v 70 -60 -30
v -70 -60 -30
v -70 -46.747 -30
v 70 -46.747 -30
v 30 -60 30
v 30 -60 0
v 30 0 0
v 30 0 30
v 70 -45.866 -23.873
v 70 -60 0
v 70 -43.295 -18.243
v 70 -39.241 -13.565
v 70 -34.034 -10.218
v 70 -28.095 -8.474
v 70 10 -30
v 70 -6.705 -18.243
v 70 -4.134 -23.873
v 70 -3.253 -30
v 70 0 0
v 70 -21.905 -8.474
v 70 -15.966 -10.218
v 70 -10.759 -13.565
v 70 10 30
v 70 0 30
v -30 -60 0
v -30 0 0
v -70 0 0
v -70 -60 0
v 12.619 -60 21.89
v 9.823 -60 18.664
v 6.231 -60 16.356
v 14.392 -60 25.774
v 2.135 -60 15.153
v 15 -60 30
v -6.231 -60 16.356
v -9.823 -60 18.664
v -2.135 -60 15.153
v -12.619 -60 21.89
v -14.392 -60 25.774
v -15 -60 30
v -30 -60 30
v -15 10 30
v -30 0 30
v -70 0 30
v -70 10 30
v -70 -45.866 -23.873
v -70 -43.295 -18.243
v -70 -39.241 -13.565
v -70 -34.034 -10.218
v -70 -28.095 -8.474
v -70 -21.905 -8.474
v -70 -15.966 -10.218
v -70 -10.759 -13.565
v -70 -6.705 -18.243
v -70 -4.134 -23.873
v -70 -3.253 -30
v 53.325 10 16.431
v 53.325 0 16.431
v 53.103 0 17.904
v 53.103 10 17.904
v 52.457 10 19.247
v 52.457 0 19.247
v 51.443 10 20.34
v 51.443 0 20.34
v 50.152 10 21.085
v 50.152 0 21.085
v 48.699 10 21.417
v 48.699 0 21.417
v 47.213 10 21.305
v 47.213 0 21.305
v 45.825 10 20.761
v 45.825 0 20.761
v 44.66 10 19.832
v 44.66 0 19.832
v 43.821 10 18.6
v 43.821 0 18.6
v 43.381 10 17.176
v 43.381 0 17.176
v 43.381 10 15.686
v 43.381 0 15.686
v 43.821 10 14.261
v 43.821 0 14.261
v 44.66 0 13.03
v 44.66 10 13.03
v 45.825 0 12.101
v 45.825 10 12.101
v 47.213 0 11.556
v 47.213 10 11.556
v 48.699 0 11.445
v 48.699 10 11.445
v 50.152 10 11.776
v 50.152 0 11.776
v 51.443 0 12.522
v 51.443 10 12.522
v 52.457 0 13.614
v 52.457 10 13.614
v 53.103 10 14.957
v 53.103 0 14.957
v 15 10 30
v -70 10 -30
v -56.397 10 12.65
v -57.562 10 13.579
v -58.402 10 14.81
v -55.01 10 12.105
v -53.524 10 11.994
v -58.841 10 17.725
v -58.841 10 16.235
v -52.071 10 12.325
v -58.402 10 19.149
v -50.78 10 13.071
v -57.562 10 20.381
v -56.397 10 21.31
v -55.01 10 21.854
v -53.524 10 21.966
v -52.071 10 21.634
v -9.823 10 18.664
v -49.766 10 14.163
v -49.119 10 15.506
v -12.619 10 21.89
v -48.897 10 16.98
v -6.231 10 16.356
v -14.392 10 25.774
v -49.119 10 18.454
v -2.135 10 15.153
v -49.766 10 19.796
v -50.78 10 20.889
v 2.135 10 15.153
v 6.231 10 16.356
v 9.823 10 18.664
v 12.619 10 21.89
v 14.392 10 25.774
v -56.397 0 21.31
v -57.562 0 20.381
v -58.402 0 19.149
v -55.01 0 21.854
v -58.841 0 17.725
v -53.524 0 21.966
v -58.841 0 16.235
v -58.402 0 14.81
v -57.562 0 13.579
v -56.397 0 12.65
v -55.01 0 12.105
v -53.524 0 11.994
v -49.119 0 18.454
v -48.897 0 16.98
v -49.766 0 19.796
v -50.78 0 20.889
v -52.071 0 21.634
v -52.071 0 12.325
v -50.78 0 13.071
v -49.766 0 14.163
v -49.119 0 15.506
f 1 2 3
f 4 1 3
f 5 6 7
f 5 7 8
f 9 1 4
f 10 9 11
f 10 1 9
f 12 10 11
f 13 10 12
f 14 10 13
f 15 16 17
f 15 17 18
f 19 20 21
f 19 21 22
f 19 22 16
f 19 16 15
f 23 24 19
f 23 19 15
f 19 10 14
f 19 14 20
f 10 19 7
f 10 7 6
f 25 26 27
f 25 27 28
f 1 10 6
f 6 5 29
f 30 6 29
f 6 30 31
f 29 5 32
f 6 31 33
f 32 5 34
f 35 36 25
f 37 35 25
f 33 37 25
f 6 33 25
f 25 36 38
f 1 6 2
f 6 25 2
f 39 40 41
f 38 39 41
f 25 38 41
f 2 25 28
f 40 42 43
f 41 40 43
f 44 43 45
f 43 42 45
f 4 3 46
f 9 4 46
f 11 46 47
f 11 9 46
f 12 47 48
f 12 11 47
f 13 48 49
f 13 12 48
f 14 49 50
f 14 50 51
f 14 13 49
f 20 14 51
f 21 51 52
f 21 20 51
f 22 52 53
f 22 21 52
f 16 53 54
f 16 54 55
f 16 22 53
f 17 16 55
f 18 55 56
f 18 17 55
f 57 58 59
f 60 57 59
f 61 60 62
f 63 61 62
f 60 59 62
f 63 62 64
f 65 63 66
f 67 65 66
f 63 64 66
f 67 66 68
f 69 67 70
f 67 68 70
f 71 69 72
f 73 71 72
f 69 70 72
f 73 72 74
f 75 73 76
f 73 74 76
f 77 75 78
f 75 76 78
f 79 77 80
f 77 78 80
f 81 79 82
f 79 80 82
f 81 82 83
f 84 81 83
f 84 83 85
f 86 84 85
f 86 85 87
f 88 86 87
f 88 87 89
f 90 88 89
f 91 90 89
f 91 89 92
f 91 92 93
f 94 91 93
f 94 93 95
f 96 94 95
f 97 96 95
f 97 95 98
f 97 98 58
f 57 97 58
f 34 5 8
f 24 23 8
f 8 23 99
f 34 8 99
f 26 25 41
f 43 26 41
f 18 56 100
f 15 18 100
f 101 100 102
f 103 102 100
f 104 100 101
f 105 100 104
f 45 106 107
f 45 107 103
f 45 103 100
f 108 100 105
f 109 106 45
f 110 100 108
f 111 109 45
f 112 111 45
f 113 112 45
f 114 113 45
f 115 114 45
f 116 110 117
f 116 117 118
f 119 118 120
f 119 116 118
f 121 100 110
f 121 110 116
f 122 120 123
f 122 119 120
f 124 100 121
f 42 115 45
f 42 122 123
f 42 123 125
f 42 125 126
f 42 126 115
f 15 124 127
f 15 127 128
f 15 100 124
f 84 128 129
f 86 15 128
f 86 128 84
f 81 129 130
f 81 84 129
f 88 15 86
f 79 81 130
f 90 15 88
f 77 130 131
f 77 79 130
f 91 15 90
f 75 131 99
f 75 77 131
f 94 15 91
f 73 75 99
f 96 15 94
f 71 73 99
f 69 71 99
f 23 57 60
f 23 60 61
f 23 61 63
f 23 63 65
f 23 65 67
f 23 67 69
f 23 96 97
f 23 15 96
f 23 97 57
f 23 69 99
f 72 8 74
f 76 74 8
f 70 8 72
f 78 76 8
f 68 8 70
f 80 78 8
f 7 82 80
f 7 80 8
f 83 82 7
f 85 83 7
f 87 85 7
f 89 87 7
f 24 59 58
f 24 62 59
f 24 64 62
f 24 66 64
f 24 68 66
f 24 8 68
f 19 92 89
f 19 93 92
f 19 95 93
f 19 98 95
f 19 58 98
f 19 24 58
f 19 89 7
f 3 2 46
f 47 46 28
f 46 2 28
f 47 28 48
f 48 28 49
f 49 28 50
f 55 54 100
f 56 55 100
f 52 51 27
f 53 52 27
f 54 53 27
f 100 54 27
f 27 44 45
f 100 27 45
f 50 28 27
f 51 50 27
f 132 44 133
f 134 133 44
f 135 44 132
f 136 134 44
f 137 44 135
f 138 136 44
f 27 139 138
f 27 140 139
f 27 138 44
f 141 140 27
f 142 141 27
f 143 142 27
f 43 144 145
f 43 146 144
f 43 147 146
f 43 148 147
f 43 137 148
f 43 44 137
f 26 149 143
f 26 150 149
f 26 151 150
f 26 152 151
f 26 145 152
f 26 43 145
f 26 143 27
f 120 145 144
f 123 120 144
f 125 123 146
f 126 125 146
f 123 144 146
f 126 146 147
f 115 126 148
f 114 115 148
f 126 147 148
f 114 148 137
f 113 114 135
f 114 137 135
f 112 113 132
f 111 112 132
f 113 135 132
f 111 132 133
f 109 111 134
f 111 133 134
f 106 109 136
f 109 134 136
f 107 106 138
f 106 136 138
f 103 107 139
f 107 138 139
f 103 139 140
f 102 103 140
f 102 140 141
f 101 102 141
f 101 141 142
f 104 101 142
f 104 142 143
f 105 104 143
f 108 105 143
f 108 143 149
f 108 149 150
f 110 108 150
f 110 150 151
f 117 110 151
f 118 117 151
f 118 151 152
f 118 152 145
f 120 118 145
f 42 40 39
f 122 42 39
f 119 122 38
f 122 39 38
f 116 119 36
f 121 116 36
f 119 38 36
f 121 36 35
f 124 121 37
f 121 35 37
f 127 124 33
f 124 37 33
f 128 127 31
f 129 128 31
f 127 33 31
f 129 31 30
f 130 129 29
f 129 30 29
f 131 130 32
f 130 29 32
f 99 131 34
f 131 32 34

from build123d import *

# Parameters (mm, degrees)
F1_DEPTH = 70
F2_W     = 30
F2_H     = 30
F3_DEPTH = 60
F4_R     = 15
F5_DEPTH = 72.5
F6_R     = 5
F7_DEPTH = 37.8
F8_R     = 5
F9_DEPTH = 25


# Not quite as in the source:
# - a pattern or mirror of a feature is missing from the dataset's text; its kind, count and spacing are read off the source's solid


with BuildPart() as f1:
    # F0 (on Right) → F1 (new body, symmetric)
    with BuildSketch(Plane.YZ):
        with BuildLine():
            Line((10, 30), (0, 30))
            Line((0, 30), (0, 0))
            Line((0, 0), (-60, 0))
            Line((-60, 0), (-60, -30))
            Line((-60, -30), (-46.7469906007, -30))
            ThreePointArc((-46.7469906007, -30), (-25, -8.2530093993), (-3.2530093993, -30))
            Line((-3.2530093993, -30), (10, -30))
            Line((10, -30), (10, 30))
        make_face()
    extrude(amount=F1_DEPTH, both=True)

    # F2 (on face) → F3 (join, through all)
    with BuildSketch(Plane.XZ):
        with Locations((15, 15)):
            Rectangle(F2_W, F2_H)
    f3 = extrude(amount=F3_DEPTH)

    # F3_copies: F3 across plane
    add(f3.mirror(Plane(origin=(0, 0, 0), x_dir=(0, 0, -1), z_dir=(-1, 0, 0))))

    # F4 (on face) → F5 (cut)
    with BuildSketch(Plane.XZ.offset(60)):
        with Locations((0, 30)):
            Circle(F4_R)
    extrude(amount=-F5_DEPTH, mode=Mode.SUBTRACT)

    # F6 (on face) → F7 (cut)
    with BuildSketch(Plane.XZ):
        with Locations((48.3254604042, 16.4307225496)):
            Circle(F6_R)
    extrude(amount=-F7_DEPTH, mode=Mode.SUBTRACT)

    # F8 (on face) → F9 (cut)
    with BuildSketch(Plane.XZ):
        with Locations((-53.8972392678, 16.9797260314)):
            Circle(F8_R)
    extrude(amount=-F9_DEPTH, mode=Mode.SUBTRACT)


solid = f1.part
